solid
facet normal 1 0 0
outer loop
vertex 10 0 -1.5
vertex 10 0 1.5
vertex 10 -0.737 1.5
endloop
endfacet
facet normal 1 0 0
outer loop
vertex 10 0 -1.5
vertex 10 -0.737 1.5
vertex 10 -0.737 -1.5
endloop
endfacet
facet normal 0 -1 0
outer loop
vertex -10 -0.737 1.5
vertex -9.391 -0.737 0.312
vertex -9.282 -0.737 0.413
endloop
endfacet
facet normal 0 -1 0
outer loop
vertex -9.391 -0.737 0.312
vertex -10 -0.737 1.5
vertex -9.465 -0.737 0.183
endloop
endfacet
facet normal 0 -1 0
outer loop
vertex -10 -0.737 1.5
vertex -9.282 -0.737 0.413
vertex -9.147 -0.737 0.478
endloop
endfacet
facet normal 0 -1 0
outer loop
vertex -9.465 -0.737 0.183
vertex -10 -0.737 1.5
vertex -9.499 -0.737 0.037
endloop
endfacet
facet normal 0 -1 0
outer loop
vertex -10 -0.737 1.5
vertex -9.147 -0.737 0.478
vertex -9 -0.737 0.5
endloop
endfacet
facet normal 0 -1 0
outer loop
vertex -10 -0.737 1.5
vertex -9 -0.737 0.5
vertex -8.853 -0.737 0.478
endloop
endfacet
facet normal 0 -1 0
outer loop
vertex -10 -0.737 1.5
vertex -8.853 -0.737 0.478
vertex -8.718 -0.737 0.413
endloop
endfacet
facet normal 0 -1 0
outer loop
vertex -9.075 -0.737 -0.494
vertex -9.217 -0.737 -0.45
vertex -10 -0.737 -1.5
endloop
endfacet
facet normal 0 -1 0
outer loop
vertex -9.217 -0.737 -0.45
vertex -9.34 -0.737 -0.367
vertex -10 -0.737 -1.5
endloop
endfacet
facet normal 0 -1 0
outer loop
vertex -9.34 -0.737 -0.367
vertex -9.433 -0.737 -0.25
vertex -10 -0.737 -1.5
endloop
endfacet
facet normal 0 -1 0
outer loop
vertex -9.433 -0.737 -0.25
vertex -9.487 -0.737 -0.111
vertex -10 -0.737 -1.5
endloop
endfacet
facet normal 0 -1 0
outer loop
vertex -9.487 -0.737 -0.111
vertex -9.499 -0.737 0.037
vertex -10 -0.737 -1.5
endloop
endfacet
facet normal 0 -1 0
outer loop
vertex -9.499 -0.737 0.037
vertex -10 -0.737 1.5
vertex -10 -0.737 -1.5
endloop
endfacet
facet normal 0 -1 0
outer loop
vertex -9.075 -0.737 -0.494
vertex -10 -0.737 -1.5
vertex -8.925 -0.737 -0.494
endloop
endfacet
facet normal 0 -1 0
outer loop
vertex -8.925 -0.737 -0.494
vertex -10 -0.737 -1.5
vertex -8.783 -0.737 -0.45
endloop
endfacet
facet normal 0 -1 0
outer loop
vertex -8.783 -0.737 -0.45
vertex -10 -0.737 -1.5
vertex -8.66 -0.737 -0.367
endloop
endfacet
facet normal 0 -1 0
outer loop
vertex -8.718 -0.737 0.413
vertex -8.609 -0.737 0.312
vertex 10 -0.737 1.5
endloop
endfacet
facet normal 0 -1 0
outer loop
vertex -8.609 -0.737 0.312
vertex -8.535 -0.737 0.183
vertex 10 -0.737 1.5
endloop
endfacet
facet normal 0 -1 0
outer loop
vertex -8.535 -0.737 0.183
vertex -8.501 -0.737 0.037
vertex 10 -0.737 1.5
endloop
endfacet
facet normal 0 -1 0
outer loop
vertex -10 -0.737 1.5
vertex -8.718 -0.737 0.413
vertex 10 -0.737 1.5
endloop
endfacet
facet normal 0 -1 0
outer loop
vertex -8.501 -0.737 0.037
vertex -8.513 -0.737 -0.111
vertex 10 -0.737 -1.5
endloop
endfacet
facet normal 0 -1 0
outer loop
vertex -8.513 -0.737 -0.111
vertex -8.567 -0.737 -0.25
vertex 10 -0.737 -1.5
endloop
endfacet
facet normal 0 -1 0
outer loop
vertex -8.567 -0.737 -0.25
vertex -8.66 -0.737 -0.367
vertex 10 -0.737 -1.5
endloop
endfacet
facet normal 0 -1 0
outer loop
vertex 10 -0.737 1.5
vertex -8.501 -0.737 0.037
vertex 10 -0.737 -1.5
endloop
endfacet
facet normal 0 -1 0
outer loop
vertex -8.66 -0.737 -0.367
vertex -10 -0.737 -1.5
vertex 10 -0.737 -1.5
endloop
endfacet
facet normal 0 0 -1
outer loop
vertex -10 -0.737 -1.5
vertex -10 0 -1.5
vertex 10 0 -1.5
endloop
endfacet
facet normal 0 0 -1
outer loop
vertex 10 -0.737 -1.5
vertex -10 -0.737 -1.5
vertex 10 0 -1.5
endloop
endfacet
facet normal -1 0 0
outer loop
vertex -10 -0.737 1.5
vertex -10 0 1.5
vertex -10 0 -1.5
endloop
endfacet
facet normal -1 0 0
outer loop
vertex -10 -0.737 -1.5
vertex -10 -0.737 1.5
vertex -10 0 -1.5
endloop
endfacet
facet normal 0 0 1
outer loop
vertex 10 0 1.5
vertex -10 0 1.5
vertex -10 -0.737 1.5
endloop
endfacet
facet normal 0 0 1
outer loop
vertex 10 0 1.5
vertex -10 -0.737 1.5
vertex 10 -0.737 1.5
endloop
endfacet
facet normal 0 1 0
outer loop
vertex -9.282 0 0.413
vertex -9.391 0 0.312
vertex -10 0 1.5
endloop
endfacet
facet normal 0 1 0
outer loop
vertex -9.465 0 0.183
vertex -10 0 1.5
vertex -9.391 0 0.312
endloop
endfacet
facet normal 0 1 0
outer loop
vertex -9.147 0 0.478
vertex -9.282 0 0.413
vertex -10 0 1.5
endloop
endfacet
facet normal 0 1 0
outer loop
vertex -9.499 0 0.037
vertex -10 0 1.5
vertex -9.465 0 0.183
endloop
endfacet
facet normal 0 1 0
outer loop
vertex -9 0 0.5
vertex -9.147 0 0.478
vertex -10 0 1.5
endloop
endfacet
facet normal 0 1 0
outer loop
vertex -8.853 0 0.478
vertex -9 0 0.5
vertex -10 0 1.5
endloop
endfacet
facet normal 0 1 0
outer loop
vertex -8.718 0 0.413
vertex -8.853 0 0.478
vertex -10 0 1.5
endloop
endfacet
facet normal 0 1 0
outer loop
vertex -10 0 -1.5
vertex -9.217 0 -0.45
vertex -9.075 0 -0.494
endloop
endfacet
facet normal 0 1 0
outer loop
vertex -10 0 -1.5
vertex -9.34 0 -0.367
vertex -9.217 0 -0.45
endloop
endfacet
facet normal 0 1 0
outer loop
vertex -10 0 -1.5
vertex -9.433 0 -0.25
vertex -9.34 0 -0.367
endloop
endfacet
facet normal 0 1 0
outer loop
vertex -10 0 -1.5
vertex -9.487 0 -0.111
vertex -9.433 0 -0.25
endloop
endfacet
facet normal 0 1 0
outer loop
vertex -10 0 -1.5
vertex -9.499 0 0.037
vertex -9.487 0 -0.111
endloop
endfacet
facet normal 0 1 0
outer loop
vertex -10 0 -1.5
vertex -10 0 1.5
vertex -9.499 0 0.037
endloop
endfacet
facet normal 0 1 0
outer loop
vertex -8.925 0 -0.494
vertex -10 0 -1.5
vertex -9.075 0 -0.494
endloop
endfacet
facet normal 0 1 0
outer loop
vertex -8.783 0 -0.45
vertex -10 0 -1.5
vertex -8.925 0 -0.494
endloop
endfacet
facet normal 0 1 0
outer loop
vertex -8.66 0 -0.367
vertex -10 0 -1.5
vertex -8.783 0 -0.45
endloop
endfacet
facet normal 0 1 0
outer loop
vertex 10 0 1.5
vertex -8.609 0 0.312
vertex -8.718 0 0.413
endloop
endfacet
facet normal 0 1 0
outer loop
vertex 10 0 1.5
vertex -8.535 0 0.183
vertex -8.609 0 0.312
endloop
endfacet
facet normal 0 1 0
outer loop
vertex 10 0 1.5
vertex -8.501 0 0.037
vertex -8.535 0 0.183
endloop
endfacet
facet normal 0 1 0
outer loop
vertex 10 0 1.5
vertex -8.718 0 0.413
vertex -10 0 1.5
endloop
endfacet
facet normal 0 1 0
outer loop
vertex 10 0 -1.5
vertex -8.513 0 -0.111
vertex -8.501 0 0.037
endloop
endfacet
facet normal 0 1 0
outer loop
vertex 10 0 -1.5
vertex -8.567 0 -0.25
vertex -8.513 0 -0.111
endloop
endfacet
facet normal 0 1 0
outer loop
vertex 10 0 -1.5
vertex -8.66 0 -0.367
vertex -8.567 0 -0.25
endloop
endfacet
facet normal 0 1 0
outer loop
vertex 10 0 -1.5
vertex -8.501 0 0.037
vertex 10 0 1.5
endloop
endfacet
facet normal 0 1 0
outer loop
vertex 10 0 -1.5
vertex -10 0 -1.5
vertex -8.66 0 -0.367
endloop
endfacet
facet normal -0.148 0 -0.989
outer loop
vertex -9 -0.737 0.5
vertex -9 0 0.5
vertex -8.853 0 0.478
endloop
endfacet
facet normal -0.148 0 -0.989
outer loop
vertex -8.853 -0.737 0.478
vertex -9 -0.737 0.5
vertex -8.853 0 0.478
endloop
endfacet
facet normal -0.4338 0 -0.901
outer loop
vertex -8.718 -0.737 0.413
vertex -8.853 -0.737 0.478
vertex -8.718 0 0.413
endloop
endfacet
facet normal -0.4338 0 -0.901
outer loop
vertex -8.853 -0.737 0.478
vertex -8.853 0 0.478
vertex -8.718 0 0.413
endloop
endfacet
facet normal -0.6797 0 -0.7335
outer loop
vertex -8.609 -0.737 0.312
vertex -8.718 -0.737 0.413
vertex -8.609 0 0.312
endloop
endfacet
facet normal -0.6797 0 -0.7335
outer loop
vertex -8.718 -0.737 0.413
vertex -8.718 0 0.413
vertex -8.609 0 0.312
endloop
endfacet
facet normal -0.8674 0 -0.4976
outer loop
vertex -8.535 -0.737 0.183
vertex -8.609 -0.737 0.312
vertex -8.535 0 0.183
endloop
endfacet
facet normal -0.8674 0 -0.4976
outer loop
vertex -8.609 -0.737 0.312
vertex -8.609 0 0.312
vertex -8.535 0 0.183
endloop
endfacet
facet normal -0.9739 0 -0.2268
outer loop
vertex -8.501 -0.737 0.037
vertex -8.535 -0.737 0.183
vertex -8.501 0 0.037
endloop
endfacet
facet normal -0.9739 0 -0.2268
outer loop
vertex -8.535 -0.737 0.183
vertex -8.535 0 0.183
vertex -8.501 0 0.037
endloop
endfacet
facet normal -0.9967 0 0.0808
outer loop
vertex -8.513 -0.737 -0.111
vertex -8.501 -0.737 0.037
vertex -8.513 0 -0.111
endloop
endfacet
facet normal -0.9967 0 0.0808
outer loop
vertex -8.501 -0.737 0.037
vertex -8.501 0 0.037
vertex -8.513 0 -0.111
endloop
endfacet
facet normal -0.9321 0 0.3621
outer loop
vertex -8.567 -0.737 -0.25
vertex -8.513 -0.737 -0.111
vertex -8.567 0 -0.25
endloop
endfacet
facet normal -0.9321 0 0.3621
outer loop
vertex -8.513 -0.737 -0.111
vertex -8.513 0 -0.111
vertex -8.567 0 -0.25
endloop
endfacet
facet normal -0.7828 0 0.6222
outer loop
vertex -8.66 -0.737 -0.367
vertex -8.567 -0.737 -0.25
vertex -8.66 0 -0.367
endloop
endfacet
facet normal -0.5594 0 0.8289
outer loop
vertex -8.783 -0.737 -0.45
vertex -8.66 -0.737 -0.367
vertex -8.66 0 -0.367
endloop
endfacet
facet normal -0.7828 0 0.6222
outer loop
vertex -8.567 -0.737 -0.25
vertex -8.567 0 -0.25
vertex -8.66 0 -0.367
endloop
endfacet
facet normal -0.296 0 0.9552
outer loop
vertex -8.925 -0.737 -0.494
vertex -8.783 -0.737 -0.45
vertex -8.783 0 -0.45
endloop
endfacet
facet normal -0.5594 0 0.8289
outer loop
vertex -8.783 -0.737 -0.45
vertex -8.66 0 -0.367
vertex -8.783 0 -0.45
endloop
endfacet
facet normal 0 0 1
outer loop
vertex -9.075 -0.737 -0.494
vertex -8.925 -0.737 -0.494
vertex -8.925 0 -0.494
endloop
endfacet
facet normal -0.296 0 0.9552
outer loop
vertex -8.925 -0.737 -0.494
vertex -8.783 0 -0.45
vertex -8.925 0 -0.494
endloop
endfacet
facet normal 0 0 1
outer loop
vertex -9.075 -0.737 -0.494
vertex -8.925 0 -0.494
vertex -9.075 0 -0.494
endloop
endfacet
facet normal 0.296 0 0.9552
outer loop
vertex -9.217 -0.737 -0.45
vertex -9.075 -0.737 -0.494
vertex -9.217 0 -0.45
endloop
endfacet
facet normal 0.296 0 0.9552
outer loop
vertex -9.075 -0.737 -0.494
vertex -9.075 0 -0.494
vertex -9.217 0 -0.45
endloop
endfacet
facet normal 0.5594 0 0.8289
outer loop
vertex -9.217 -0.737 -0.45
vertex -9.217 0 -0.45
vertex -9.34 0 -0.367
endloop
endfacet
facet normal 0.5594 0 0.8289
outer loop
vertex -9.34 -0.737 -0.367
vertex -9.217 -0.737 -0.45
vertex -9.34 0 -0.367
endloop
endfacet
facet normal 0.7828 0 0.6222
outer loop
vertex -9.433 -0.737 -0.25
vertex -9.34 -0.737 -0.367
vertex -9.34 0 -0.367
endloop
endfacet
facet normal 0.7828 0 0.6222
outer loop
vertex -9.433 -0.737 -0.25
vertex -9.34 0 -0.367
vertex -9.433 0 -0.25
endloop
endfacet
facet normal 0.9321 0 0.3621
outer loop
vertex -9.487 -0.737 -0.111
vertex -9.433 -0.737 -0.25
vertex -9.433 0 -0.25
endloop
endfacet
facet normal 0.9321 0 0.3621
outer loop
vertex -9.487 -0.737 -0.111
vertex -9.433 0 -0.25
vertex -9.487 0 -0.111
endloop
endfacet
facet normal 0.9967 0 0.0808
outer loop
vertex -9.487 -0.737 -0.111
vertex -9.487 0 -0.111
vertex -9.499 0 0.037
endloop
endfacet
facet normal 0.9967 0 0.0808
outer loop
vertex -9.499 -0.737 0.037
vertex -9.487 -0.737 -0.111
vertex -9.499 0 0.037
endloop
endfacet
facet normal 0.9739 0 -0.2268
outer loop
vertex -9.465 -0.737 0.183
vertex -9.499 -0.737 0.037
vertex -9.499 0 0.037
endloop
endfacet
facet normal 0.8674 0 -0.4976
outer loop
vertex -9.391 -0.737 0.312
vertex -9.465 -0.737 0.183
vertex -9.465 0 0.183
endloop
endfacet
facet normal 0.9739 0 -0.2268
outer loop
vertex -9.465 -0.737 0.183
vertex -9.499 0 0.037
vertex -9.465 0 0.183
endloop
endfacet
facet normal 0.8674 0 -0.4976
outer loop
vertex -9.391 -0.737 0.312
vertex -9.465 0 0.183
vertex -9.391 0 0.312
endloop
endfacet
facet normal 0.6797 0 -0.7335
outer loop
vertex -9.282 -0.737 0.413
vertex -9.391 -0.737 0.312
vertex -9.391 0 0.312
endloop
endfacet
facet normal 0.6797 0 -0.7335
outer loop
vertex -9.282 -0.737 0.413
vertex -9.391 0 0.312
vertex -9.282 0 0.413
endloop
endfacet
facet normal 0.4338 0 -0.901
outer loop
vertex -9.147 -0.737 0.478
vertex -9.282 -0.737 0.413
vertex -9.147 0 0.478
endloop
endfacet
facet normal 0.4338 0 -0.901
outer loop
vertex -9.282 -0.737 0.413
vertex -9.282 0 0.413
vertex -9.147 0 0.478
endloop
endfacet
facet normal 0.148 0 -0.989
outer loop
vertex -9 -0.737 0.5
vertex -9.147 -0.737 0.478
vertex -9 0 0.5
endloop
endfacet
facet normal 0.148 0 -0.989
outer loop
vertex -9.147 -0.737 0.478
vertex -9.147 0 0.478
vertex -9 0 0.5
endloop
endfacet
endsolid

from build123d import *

# Parameters (mm, degrees)
SKETCH1_W          = 20
SKETCH1_H          = 3
SKETCH1_R          = 0.5
BASE_FLANGE1_DEPTH = 0.7366


# Sheet-metal steps are written as plain solids
with BuildPart() as part:
    # Sketch1 → Base-Flange1 (new body)
    with BuildSketch(Plane(origin=(0, 0, 0), x_dir=(1, 0, 0), z_dir=(0, 1, 0))):
        Rectangle(SKETCH1_W, SKETCH1_H)
        with Locations(Location((-9, 0, 0), (0, 0, 270))):
            Circle(SKETCH1_R, mode=Mode.SUBTRACT)
    extrude(amount=-BASE_FLANGE1_DEPTH)


solid = part.part
